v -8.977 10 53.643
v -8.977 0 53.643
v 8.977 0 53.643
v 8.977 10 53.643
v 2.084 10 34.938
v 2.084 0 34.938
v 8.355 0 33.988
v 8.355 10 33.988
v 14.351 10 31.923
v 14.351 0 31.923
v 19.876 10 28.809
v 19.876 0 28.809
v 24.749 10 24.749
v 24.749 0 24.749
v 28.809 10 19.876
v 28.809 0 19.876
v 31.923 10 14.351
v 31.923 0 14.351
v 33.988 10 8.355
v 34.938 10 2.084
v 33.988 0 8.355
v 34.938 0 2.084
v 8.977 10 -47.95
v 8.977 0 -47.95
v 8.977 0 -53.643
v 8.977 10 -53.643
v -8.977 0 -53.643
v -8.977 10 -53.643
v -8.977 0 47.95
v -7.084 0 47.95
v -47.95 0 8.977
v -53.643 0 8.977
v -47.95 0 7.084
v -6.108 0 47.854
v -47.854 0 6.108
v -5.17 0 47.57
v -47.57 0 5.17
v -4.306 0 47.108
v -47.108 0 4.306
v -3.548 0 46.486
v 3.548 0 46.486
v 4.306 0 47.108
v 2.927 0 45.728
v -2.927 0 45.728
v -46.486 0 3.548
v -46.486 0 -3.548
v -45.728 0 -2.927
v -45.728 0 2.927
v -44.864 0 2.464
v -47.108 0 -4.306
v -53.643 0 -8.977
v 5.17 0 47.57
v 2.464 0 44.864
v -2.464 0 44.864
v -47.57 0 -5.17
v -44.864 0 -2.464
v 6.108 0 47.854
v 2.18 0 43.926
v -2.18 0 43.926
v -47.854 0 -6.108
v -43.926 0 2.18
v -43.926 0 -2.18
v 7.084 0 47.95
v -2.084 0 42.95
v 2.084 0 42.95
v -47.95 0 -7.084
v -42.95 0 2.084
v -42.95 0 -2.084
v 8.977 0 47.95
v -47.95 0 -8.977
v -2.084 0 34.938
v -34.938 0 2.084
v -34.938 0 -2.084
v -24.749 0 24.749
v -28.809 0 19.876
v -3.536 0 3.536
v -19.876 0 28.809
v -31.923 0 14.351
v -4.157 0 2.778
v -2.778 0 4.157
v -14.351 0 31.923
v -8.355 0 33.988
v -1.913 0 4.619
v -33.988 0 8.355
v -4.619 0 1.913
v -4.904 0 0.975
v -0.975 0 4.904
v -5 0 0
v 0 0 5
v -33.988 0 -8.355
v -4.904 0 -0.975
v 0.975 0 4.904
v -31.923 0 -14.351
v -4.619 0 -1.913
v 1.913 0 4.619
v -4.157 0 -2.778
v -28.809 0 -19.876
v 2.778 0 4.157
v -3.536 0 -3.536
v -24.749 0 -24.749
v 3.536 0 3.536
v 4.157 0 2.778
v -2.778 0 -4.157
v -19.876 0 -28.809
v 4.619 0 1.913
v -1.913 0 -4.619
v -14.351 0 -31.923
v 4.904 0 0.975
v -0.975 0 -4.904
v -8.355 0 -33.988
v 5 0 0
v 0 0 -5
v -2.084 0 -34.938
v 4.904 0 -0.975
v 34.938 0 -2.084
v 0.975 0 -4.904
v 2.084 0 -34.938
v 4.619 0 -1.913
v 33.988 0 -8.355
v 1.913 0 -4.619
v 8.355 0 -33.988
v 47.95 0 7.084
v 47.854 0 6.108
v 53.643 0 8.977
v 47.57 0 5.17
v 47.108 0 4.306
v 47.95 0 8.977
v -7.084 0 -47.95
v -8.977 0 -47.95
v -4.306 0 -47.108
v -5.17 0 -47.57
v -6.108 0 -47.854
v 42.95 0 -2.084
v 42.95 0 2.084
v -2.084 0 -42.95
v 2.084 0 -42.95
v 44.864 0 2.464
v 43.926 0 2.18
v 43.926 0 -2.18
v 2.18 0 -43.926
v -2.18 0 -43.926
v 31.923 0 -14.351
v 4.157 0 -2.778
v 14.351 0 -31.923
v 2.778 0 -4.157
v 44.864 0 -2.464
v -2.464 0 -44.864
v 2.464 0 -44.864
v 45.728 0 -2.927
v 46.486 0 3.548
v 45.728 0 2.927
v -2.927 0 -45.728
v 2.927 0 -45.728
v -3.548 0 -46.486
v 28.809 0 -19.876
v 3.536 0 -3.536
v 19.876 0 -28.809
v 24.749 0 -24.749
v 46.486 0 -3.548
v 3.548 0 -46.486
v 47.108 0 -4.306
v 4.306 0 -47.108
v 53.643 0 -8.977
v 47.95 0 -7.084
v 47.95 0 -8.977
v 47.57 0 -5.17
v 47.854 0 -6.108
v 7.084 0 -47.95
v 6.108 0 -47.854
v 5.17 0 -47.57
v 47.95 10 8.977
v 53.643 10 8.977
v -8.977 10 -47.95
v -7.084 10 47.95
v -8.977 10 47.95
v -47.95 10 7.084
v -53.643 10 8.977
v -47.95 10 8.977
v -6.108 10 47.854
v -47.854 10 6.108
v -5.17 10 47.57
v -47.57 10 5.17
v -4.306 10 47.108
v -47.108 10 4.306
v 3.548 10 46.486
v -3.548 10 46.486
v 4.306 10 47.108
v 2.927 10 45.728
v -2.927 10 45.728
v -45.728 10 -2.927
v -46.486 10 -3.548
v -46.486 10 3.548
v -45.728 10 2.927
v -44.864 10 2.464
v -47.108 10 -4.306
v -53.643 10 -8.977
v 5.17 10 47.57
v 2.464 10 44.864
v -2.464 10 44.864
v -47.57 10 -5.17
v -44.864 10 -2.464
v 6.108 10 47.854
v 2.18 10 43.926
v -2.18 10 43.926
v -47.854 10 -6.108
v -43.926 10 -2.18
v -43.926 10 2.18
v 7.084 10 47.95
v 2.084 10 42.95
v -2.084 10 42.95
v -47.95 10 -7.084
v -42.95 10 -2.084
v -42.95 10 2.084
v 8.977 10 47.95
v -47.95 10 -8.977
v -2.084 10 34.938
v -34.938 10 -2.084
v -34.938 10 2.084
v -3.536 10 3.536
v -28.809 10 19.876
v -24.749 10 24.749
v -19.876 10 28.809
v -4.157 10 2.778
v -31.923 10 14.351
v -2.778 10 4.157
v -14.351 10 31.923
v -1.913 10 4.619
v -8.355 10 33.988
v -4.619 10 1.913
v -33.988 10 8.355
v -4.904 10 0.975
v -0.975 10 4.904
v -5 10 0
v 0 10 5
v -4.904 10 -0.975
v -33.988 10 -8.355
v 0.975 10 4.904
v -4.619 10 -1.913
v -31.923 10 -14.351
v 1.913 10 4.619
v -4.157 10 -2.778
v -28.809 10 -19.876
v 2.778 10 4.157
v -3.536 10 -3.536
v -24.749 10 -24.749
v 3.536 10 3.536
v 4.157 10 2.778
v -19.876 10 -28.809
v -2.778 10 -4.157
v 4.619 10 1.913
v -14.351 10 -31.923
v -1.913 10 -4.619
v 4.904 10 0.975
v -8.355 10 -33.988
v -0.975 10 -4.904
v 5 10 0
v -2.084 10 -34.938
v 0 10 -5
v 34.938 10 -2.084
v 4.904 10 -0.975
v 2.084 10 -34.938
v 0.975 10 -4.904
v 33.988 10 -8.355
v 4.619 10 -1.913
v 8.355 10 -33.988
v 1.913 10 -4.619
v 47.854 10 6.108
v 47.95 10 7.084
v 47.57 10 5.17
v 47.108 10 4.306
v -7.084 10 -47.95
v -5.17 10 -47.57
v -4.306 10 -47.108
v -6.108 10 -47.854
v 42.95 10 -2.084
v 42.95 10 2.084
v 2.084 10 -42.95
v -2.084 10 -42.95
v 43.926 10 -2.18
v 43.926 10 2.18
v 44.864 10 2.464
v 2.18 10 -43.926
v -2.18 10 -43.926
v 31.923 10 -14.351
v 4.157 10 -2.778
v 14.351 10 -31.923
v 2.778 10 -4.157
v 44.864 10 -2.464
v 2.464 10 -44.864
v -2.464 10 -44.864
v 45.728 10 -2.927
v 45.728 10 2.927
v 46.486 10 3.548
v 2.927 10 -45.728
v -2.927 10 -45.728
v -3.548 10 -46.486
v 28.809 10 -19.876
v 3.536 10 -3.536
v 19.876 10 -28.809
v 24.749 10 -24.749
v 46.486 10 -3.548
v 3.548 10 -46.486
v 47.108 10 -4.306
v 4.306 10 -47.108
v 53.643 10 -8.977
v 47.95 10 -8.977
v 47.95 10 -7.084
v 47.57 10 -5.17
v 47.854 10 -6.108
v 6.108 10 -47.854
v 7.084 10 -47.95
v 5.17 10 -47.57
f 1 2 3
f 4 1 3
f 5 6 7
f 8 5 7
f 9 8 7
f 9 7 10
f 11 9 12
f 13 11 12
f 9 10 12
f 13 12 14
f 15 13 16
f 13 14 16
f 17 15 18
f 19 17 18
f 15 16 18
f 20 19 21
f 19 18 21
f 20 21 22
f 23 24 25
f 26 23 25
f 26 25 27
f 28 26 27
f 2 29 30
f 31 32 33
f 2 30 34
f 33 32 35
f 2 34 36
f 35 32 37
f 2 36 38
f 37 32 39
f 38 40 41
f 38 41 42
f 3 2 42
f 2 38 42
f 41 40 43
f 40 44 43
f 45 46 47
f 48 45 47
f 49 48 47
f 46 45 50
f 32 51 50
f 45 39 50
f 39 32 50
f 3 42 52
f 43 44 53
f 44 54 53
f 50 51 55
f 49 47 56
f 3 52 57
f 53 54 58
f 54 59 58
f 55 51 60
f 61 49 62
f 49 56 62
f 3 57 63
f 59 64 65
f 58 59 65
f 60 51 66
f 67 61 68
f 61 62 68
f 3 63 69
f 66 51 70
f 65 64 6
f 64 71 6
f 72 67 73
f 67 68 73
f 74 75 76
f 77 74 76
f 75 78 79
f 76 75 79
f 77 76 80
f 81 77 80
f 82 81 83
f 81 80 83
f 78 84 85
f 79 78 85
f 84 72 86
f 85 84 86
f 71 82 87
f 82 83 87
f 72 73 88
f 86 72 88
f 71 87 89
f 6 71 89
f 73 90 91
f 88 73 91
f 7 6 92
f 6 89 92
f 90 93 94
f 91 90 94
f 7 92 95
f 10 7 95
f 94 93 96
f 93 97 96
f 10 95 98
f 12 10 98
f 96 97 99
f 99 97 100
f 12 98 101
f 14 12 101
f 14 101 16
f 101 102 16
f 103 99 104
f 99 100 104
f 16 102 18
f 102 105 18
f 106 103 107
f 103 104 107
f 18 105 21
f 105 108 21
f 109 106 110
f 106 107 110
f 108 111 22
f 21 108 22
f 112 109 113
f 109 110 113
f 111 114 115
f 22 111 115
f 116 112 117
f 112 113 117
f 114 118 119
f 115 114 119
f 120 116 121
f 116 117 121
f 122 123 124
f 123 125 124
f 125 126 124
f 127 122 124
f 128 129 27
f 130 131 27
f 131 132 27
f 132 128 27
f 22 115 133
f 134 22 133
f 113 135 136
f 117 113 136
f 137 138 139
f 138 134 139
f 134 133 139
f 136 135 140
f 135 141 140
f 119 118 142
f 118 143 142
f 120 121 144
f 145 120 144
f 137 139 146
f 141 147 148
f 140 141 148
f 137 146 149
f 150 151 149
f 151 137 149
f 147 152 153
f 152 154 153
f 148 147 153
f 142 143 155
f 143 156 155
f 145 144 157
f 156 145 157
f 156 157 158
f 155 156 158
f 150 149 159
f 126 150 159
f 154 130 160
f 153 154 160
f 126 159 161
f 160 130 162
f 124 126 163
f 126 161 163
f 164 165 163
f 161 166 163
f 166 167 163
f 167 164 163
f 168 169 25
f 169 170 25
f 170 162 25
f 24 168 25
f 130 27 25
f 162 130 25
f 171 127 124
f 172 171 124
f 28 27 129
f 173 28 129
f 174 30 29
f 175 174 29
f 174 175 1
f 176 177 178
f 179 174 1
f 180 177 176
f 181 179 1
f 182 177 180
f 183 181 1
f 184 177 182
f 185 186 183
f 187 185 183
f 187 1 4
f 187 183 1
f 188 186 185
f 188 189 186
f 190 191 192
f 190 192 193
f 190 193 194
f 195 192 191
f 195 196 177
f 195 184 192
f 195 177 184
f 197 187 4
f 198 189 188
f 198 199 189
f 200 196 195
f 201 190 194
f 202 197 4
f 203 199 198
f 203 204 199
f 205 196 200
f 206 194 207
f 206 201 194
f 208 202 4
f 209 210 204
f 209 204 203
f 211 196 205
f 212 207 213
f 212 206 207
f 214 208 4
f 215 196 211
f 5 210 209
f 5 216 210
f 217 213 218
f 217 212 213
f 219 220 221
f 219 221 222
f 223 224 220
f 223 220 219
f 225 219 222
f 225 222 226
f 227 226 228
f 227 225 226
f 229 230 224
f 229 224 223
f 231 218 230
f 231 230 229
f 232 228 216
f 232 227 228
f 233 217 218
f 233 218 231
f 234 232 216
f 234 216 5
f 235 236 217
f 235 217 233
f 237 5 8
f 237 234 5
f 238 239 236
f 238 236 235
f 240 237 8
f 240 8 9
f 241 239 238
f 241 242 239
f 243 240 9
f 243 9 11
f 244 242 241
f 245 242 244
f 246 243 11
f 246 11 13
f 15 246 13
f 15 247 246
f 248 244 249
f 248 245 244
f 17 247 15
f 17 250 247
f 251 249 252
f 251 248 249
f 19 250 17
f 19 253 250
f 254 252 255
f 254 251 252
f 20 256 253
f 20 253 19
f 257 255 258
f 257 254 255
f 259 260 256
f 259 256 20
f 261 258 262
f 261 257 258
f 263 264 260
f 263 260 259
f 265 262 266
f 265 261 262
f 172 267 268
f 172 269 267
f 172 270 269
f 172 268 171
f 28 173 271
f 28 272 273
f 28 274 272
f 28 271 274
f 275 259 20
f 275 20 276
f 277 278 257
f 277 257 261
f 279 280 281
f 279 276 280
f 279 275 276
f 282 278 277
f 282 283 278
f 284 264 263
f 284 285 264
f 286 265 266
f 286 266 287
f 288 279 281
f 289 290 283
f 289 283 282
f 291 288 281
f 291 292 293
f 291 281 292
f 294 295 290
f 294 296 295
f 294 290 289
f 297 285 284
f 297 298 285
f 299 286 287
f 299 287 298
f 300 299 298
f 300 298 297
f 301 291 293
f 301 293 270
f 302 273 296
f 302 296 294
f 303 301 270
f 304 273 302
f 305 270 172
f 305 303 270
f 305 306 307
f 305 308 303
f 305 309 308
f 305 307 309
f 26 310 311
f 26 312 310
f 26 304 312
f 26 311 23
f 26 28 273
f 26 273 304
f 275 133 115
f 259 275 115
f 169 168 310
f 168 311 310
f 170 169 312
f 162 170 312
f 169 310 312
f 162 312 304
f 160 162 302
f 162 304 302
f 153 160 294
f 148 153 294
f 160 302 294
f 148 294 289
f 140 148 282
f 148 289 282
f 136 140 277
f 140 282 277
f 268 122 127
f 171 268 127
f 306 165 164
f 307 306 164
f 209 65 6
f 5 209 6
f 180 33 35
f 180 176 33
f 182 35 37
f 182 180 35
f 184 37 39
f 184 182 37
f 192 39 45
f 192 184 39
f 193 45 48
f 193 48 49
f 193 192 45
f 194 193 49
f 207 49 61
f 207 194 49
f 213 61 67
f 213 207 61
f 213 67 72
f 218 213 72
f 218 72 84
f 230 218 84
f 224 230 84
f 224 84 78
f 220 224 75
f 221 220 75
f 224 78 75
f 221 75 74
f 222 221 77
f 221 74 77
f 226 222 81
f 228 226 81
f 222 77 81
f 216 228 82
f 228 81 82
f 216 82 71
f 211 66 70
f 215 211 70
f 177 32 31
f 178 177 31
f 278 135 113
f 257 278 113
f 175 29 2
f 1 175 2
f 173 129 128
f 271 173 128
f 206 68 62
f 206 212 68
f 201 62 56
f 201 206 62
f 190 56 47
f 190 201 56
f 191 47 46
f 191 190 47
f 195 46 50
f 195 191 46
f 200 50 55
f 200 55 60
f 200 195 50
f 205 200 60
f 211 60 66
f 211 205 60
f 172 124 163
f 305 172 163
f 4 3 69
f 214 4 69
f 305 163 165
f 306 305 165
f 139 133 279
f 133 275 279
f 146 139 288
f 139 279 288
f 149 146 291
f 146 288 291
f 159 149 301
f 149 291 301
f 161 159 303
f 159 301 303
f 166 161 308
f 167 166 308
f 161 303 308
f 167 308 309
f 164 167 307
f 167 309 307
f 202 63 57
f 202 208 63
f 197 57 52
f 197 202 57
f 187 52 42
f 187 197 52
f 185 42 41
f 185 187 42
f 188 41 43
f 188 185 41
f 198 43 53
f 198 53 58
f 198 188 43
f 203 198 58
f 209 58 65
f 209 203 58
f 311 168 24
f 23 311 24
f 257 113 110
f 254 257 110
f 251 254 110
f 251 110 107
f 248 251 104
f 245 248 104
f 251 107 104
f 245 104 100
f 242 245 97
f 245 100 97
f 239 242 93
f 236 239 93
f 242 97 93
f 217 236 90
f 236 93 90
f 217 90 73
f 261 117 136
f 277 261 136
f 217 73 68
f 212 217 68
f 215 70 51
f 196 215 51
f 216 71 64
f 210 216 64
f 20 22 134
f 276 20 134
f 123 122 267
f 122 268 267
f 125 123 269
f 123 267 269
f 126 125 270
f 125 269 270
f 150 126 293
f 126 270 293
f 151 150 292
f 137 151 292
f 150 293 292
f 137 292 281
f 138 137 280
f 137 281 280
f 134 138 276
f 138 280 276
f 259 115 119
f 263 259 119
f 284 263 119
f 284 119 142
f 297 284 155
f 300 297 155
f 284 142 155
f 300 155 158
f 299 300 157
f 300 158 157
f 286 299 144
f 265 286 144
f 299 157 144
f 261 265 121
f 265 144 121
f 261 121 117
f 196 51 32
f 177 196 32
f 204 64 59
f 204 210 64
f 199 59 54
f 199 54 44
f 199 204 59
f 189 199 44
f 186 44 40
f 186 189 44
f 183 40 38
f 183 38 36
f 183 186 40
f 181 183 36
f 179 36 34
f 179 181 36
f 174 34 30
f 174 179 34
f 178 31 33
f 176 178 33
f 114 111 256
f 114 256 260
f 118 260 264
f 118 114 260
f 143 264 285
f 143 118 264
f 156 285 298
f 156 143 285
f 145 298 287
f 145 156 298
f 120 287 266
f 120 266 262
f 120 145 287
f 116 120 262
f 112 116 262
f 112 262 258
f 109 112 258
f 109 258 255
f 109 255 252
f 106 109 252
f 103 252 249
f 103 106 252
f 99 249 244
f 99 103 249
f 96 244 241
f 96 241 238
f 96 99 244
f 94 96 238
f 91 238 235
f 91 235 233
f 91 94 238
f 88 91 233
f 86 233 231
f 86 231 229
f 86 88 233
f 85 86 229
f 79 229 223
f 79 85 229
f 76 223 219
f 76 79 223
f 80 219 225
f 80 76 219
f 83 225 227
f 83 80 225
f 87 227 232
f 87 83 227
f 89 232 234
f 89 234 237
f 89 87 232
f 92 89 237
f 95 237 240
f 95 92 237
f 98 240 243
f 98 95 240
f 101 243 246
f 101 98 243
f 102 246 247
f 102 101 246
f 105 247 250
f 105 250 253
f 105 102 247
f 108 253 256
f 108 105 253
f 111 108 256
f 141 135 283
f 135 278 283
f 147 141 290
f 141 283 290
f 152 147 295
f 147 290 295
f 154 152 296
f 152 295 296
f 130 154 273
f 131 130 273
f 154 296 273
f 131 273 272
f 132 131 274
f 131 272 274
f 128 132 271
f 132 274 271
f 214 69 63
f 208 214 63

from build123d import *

# Parameters (mm, degrees)
SKETCH1_R           = 5
BOSS_EXTRUDE1_DEPTH = 10
FILLET1_R           = 5


with BuildPart() as part:
    # Sketch1 → Boss-Extrude1 (new body)
    with BuildSketch(Plane(origin=(0, 0, 0), x_dir=(1, 0, 0), z_dir=(0, 1, 0))):
        with BuildLine():
            Line((-2.083872426, 47.950209336), (-2.083872426, 34.937908863))
            ThreePointArc((-2.083872426, 34.937908863), (-24.748737342, 24.748737342), (-34.937908863, 2.083872426))
            Line((-34.937908863, 2.083872426), (-47.950209336, 2.083872426))
            Line((-47.950209336, 2.083872426), (-47.950209336, 8.976599642))
            Line((-47.950209336, 8.976599642), (-53.642672207, 8.976599642))
            Line((-53.642672207, 8.976599642), (-53.642672207, -8.976599642))
            Line((-53.642672207, -8.976599642), (-47.950209336, -8.976599642))
            Line((-47.950209336, -8.976599642), (-47.950209336, -2.083872426))
            Line((-47.950209336, -2.083872426), (-34.937908863, -2.083872426))
            ThreePointArc((-34.937908863, -2.083872426), (-24.748737342, -24.748737342), (-2.083872426, -34.937908863))
            Line((-2.083872426, -34.937908863), (-2.083872426, -47.950209336))
            Line((-2.083872426, -47.950209336), (-8.976599642, -47.950209336))
            Line((-8.976599642, -47.950209336), (-8.976599642, -53.642672207))
            Line((-8.976599642, -53.642672207), (8.976599642, -53.642672207))
            Line((8.976599642, -53.642672207), (8.976599642, -47.950209336))
            Line((8.976599642, -47.950209336), (2.083872426, -47.950209336))
            Line((2.083872426, -47.950209336), (2.083872426, -34.937908863))
            ThreePointArc((2.083872426, -34.937908863), (24.748737342, -24.748737342), (34.937908863, -2.083872426))
            Line((34.937908863, -2.083872426), (47.950209336, -2.083872426))
            Line((47.950209336, -2.083872426), (47.950209336, -8.976599642))
            Line((47.950209336, -8.976599642), (53.642672207, -8.976599642))
            Line((53.642672207, -8.976599642), (53.642672207, 8.976599642))
            Line((53.642672207, 8.976599642), (47.950209336, 8.976599642))
            Line((47.950209336, 8.976599642), (47.950209336, 2.083872426))
            Line((47.950209336, 2.083872426), (34.937908863, 2.083872426))
            ThreePointArc((34.937908863, 2.083872426), (24.748737342, 24.748737342), (2.083872426, 34.937908863))
            Line((2.083872426, 34.937908863), (2.083872426, 47.950209336))
            Line((2.083872426, 47.950209336), (8.976599642, 47.950209336))
            Line((8.976599642, 47.950209336), (8.976599642, 53.642672207))
            Line((8.976599642, 53.642672207), (-8.976599642, 53.642672207))
            Line((-8.976599642, 53.642672207), (-8.976599642, 47.950209336))
            Line((-8.976599642, 47.950209336), (-2.083872426, 47.950209336))
        make_face()
        Circle(SKETCH1_R, mode=Mode.SUBTRACT)
    extrude(amount=BOSS_EXTRUDE1_DEPTH)

    # Fillet1
    fillet1_edges = [part.edges().sort_by_distance(p)[0] for p in [
        (2.083872426, 5, 47.950209336),
        (-2.083872426, 5, 47.950209336),
        (-47.950209336, 5, 2.083872426),
        (-47.950209336, 5, -2.083872426),
        (-2.083872426, 5, -47.950209336),
        (2.083872426, 5, -47.950209336),
        (47.950209336, 5, -2.083872426),
        (47.950209336, 5, 2.083872426),
    ]]
    fillet(fillet1_edges, radius=FILLET1_R)


solid = part.part
